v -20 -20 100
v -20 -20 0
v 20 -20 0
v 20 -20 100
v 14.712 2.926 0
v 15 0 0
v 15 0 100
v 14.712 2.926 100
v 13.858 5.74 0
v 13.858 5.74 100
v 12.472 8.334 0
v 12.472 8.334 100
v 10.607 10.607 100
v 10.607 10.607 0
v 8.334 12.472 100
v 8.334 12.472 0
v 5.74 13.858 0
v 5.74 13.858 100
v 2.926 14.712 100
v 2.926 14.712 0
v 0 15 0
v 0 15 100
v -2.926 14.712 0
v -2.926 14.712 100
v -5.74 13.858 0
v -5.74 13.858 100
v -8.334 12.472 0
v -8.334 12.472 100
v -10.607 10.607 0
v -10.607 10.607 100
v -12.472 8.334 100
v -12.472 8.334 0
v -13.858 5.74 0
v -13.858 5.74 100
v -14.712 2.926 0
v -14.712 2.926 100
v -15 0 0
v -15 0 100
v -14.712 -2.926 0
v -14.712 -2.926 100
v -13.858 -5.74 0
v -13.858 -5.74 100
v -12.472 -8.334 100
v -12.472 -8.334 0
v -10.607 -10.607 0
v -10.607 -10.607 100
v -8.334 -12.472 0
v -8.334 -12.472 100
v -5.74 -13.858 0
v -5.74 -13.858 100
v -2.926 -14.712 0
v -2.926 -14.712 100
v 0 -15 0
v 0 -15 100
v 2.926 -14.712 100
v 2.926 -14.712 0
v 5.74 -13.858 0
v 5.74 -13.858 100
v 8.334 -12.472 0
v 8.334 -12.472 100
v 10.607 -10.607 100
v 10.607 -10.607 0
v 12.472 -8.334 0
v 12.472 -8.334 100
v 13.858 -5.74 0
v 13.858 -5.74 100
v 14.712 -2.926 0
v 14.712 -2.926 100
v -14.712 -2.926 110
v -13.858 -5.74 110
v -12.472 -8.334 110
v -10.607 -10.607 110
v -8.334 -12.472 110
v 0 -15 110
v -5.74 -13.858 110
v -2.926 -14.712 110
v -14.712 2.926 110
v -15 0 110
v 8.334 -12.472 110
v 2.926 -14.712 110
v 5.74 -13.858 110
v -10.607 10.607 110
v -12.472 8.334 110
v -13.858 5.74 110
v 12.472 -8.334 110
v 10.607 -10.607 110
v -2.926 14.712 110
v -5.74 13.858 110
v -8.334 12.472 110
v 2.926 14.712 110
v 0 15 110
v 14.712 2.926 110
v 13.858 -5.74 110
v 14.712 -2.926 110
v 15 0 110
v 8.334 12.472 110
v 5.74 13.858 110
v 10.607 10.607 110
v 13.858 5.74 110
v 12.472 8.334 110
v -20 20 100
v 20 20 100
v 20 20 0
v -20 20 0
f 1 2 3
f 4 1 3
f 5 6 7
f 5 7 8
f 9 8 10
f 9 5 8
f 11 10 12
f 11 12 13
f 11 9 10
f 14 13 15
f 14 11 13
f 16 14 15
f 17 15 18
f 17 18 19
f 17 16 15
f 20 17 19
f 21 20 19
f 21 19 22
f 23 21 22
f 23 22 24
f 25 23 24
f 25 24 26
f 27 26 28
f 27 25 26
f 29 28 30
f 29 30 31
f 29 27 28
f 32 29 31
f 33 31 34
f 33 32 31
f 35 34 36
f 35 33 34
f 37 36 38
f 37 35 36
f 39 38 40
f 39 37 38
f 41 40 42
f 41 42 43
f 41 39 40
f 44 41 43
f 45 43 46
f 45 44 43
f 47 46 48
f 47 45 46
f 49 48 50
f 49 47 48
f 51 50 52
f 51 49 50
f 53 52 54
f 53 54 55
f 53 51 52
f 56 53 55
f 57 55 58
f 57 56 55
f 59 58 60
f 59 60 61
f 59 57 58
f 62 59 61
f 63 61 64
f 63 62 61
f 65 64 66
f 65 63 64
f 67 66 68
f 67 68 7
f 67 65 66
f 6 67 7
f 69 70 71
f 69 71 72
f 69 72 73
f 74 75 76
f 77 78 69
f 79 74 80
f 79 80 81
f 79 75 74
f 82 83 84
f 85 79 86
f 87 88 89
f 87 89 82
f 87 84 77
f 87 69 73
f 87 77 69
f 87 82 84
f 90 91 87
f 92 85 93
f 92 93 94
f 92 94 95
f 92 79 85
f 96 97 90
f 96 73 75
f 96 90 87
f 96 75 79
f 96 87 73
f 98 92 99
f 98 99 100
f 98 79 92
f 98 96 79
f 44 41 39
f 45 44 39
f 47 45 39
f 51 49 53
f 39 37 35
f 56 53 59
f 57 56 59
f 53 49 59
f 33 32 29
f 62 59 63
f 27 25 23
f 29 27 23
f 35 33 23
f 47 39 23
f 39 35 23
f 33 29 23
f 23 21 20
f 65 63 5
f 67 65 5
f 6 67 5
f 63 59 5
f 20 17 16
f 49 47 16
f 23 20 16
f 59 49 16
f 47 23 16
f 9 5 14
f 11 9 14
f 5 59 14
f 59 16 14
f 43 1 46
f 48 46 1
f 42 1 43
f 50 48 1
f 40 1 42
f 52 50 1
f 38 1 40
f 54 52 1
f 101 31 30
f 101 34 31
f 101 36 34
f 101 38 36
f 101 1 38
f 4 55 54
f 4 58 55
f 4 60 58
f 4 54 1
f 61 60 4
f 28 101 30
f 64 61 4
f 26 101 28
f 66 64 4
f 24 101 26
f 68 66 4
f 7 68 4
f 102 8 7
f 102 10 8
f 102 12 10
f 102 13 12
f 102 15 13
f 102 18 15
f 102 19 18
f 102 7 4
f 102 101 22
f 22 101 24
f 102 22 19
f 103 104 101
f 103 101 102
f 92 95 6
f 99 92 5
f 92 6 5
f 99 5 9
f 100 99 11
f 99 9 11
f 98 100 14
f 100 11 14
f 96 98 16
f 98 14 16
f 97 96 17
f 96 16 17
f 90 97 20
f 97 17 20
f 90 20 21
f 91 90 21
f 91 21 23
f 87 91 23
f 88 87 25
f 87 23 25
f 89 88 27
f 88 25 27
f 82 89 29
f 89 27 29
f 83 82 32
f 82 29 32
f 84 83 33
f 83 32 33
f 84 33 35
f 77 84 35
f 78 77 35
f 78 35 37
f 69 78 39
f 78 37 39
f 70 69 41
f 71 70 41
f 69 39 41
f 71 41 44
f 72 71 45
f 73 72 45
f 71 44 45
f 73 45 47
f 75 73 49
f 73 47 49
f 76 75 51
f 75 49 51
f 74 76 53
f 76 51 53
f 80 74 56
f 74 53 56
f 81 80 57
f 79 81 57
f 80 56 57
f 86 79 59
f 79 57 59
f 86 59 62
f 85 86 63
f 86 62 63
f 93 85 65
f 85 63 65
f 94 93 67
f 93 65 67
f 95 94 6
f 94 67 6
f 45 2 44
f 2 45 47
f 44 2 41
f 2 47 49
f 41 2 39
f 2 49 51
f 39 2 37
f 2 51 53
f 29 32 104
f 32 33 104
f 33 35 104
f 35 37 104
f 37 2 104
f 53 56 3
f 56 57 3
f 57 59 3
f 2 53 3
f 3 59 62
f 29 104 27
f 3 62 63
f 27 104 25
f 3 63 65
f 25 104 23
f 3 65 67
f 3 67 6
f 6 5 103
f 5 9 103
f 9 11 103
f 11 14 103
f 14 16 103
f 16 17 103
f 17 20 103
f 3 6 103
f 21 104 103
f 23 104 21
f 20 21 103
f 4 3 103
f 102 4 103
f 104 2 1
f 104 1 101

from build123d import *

# Parameters (mm, degrees)
F0_W     = 40
F0_H     = 40
F0_R     = 15
F1_DEPTH = 100
F2_R     = 15
F3_DEPTH = 110


with BuildPart() as f1:
    # F0 (on Top) → F1 (new body)
    with BuildSketch(Plane.XY):
        Rectangle(F0_W, F0_H)
        Circle(F0_R, mode=Mode.SUBTRACT)
    extrude(amount=F1_DEPTH)


with BuildPart() as f3:
    # F2 (on Top) → F3 (new body)
    with BuildSketch(Plane.XY):
        Circle(F2_R)
    extrude(amount=F3_DEPTH)


solid = Compound([f1.part, f3.part])
